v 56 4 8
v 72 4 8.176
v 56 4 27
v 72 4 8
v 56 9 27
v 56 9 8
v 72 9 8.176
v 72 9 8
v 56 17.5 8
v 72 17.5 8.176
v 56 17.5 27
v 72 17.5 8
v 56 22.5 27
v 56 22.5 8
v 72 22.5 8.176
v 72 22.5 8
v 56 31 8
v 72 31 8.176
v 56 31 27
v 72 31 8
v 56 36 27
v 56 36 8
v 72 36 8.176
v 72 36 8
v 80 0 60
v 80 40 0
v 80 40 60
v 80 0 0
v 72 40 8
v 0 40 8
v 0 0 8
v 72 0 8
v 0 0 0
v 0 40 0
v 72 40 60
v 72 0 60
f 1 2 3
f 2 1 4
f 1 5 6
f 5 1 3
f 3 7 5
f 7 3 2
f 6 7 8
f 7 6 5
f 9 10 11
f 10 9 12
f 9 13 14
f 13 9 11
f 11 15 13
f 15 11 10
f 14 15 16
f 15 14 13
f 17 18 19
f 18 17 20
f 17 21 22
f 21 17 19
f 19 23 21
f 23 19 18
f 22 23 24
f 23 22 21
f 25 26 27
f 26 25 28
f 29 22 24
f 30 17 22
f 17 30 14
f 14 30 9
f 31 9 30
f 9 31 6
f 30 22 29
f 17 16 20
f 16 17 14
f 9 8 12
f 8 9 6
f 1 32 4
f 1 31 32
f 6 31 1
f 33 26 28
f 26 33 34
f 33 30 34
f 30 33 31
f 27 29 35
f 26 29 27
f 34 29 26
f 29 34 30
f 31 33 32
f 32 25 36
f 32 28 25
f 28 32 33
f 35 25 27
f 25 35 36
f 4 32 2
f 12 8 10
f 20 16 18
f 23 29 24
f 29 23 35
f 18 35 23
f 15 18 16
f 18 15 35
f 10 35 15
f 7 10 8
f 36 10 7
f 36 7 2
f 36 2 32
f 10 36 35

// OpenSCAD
$fn = 32;

// ----------------------------------------------------------------------
// Rib bracket: 3-gusset L bracket
// ----------------------------------------------------------------------

// --- parameters (mm) ---
base_l = 80;              // foot length, X
base_w = 40;              // foot width, Y
base_t = 8;               // foot thickness
plate_t = 8;              // upright plate thickness
plate_h = 60;             // overall height
gus_l = 16;               // gusset leg along the foot
gus_h = 20;               // gusset height
gus_t = 5;                // gusset thickness
gus_edge = 4;             // gusset margin from the foot edge
n_gus = 3;                // gusset count

gus_pitch = (base_w - 2 * gus_edge - gus_t) / (n_gus - 1);  // gusset pitch

union() {
  cube([base_l, base_w, base_t]);
  translate([base_l - plate_t, 0, base_t - 1])
    cube([plate_t, base_w, plate_h - base_t + 1]);
  for (i = [0 : n_gus - 1])
    translate([base_l - plate_t - gus_l, gus_edge + i * gus_pitch, base_t - 1])
      rotate([-90, 0, 0])
        linear_extrude(height = gus_t)
          polygon(points = [[0, 0], [gus_l + 1, 0], [0, -gus_h]]);
}
